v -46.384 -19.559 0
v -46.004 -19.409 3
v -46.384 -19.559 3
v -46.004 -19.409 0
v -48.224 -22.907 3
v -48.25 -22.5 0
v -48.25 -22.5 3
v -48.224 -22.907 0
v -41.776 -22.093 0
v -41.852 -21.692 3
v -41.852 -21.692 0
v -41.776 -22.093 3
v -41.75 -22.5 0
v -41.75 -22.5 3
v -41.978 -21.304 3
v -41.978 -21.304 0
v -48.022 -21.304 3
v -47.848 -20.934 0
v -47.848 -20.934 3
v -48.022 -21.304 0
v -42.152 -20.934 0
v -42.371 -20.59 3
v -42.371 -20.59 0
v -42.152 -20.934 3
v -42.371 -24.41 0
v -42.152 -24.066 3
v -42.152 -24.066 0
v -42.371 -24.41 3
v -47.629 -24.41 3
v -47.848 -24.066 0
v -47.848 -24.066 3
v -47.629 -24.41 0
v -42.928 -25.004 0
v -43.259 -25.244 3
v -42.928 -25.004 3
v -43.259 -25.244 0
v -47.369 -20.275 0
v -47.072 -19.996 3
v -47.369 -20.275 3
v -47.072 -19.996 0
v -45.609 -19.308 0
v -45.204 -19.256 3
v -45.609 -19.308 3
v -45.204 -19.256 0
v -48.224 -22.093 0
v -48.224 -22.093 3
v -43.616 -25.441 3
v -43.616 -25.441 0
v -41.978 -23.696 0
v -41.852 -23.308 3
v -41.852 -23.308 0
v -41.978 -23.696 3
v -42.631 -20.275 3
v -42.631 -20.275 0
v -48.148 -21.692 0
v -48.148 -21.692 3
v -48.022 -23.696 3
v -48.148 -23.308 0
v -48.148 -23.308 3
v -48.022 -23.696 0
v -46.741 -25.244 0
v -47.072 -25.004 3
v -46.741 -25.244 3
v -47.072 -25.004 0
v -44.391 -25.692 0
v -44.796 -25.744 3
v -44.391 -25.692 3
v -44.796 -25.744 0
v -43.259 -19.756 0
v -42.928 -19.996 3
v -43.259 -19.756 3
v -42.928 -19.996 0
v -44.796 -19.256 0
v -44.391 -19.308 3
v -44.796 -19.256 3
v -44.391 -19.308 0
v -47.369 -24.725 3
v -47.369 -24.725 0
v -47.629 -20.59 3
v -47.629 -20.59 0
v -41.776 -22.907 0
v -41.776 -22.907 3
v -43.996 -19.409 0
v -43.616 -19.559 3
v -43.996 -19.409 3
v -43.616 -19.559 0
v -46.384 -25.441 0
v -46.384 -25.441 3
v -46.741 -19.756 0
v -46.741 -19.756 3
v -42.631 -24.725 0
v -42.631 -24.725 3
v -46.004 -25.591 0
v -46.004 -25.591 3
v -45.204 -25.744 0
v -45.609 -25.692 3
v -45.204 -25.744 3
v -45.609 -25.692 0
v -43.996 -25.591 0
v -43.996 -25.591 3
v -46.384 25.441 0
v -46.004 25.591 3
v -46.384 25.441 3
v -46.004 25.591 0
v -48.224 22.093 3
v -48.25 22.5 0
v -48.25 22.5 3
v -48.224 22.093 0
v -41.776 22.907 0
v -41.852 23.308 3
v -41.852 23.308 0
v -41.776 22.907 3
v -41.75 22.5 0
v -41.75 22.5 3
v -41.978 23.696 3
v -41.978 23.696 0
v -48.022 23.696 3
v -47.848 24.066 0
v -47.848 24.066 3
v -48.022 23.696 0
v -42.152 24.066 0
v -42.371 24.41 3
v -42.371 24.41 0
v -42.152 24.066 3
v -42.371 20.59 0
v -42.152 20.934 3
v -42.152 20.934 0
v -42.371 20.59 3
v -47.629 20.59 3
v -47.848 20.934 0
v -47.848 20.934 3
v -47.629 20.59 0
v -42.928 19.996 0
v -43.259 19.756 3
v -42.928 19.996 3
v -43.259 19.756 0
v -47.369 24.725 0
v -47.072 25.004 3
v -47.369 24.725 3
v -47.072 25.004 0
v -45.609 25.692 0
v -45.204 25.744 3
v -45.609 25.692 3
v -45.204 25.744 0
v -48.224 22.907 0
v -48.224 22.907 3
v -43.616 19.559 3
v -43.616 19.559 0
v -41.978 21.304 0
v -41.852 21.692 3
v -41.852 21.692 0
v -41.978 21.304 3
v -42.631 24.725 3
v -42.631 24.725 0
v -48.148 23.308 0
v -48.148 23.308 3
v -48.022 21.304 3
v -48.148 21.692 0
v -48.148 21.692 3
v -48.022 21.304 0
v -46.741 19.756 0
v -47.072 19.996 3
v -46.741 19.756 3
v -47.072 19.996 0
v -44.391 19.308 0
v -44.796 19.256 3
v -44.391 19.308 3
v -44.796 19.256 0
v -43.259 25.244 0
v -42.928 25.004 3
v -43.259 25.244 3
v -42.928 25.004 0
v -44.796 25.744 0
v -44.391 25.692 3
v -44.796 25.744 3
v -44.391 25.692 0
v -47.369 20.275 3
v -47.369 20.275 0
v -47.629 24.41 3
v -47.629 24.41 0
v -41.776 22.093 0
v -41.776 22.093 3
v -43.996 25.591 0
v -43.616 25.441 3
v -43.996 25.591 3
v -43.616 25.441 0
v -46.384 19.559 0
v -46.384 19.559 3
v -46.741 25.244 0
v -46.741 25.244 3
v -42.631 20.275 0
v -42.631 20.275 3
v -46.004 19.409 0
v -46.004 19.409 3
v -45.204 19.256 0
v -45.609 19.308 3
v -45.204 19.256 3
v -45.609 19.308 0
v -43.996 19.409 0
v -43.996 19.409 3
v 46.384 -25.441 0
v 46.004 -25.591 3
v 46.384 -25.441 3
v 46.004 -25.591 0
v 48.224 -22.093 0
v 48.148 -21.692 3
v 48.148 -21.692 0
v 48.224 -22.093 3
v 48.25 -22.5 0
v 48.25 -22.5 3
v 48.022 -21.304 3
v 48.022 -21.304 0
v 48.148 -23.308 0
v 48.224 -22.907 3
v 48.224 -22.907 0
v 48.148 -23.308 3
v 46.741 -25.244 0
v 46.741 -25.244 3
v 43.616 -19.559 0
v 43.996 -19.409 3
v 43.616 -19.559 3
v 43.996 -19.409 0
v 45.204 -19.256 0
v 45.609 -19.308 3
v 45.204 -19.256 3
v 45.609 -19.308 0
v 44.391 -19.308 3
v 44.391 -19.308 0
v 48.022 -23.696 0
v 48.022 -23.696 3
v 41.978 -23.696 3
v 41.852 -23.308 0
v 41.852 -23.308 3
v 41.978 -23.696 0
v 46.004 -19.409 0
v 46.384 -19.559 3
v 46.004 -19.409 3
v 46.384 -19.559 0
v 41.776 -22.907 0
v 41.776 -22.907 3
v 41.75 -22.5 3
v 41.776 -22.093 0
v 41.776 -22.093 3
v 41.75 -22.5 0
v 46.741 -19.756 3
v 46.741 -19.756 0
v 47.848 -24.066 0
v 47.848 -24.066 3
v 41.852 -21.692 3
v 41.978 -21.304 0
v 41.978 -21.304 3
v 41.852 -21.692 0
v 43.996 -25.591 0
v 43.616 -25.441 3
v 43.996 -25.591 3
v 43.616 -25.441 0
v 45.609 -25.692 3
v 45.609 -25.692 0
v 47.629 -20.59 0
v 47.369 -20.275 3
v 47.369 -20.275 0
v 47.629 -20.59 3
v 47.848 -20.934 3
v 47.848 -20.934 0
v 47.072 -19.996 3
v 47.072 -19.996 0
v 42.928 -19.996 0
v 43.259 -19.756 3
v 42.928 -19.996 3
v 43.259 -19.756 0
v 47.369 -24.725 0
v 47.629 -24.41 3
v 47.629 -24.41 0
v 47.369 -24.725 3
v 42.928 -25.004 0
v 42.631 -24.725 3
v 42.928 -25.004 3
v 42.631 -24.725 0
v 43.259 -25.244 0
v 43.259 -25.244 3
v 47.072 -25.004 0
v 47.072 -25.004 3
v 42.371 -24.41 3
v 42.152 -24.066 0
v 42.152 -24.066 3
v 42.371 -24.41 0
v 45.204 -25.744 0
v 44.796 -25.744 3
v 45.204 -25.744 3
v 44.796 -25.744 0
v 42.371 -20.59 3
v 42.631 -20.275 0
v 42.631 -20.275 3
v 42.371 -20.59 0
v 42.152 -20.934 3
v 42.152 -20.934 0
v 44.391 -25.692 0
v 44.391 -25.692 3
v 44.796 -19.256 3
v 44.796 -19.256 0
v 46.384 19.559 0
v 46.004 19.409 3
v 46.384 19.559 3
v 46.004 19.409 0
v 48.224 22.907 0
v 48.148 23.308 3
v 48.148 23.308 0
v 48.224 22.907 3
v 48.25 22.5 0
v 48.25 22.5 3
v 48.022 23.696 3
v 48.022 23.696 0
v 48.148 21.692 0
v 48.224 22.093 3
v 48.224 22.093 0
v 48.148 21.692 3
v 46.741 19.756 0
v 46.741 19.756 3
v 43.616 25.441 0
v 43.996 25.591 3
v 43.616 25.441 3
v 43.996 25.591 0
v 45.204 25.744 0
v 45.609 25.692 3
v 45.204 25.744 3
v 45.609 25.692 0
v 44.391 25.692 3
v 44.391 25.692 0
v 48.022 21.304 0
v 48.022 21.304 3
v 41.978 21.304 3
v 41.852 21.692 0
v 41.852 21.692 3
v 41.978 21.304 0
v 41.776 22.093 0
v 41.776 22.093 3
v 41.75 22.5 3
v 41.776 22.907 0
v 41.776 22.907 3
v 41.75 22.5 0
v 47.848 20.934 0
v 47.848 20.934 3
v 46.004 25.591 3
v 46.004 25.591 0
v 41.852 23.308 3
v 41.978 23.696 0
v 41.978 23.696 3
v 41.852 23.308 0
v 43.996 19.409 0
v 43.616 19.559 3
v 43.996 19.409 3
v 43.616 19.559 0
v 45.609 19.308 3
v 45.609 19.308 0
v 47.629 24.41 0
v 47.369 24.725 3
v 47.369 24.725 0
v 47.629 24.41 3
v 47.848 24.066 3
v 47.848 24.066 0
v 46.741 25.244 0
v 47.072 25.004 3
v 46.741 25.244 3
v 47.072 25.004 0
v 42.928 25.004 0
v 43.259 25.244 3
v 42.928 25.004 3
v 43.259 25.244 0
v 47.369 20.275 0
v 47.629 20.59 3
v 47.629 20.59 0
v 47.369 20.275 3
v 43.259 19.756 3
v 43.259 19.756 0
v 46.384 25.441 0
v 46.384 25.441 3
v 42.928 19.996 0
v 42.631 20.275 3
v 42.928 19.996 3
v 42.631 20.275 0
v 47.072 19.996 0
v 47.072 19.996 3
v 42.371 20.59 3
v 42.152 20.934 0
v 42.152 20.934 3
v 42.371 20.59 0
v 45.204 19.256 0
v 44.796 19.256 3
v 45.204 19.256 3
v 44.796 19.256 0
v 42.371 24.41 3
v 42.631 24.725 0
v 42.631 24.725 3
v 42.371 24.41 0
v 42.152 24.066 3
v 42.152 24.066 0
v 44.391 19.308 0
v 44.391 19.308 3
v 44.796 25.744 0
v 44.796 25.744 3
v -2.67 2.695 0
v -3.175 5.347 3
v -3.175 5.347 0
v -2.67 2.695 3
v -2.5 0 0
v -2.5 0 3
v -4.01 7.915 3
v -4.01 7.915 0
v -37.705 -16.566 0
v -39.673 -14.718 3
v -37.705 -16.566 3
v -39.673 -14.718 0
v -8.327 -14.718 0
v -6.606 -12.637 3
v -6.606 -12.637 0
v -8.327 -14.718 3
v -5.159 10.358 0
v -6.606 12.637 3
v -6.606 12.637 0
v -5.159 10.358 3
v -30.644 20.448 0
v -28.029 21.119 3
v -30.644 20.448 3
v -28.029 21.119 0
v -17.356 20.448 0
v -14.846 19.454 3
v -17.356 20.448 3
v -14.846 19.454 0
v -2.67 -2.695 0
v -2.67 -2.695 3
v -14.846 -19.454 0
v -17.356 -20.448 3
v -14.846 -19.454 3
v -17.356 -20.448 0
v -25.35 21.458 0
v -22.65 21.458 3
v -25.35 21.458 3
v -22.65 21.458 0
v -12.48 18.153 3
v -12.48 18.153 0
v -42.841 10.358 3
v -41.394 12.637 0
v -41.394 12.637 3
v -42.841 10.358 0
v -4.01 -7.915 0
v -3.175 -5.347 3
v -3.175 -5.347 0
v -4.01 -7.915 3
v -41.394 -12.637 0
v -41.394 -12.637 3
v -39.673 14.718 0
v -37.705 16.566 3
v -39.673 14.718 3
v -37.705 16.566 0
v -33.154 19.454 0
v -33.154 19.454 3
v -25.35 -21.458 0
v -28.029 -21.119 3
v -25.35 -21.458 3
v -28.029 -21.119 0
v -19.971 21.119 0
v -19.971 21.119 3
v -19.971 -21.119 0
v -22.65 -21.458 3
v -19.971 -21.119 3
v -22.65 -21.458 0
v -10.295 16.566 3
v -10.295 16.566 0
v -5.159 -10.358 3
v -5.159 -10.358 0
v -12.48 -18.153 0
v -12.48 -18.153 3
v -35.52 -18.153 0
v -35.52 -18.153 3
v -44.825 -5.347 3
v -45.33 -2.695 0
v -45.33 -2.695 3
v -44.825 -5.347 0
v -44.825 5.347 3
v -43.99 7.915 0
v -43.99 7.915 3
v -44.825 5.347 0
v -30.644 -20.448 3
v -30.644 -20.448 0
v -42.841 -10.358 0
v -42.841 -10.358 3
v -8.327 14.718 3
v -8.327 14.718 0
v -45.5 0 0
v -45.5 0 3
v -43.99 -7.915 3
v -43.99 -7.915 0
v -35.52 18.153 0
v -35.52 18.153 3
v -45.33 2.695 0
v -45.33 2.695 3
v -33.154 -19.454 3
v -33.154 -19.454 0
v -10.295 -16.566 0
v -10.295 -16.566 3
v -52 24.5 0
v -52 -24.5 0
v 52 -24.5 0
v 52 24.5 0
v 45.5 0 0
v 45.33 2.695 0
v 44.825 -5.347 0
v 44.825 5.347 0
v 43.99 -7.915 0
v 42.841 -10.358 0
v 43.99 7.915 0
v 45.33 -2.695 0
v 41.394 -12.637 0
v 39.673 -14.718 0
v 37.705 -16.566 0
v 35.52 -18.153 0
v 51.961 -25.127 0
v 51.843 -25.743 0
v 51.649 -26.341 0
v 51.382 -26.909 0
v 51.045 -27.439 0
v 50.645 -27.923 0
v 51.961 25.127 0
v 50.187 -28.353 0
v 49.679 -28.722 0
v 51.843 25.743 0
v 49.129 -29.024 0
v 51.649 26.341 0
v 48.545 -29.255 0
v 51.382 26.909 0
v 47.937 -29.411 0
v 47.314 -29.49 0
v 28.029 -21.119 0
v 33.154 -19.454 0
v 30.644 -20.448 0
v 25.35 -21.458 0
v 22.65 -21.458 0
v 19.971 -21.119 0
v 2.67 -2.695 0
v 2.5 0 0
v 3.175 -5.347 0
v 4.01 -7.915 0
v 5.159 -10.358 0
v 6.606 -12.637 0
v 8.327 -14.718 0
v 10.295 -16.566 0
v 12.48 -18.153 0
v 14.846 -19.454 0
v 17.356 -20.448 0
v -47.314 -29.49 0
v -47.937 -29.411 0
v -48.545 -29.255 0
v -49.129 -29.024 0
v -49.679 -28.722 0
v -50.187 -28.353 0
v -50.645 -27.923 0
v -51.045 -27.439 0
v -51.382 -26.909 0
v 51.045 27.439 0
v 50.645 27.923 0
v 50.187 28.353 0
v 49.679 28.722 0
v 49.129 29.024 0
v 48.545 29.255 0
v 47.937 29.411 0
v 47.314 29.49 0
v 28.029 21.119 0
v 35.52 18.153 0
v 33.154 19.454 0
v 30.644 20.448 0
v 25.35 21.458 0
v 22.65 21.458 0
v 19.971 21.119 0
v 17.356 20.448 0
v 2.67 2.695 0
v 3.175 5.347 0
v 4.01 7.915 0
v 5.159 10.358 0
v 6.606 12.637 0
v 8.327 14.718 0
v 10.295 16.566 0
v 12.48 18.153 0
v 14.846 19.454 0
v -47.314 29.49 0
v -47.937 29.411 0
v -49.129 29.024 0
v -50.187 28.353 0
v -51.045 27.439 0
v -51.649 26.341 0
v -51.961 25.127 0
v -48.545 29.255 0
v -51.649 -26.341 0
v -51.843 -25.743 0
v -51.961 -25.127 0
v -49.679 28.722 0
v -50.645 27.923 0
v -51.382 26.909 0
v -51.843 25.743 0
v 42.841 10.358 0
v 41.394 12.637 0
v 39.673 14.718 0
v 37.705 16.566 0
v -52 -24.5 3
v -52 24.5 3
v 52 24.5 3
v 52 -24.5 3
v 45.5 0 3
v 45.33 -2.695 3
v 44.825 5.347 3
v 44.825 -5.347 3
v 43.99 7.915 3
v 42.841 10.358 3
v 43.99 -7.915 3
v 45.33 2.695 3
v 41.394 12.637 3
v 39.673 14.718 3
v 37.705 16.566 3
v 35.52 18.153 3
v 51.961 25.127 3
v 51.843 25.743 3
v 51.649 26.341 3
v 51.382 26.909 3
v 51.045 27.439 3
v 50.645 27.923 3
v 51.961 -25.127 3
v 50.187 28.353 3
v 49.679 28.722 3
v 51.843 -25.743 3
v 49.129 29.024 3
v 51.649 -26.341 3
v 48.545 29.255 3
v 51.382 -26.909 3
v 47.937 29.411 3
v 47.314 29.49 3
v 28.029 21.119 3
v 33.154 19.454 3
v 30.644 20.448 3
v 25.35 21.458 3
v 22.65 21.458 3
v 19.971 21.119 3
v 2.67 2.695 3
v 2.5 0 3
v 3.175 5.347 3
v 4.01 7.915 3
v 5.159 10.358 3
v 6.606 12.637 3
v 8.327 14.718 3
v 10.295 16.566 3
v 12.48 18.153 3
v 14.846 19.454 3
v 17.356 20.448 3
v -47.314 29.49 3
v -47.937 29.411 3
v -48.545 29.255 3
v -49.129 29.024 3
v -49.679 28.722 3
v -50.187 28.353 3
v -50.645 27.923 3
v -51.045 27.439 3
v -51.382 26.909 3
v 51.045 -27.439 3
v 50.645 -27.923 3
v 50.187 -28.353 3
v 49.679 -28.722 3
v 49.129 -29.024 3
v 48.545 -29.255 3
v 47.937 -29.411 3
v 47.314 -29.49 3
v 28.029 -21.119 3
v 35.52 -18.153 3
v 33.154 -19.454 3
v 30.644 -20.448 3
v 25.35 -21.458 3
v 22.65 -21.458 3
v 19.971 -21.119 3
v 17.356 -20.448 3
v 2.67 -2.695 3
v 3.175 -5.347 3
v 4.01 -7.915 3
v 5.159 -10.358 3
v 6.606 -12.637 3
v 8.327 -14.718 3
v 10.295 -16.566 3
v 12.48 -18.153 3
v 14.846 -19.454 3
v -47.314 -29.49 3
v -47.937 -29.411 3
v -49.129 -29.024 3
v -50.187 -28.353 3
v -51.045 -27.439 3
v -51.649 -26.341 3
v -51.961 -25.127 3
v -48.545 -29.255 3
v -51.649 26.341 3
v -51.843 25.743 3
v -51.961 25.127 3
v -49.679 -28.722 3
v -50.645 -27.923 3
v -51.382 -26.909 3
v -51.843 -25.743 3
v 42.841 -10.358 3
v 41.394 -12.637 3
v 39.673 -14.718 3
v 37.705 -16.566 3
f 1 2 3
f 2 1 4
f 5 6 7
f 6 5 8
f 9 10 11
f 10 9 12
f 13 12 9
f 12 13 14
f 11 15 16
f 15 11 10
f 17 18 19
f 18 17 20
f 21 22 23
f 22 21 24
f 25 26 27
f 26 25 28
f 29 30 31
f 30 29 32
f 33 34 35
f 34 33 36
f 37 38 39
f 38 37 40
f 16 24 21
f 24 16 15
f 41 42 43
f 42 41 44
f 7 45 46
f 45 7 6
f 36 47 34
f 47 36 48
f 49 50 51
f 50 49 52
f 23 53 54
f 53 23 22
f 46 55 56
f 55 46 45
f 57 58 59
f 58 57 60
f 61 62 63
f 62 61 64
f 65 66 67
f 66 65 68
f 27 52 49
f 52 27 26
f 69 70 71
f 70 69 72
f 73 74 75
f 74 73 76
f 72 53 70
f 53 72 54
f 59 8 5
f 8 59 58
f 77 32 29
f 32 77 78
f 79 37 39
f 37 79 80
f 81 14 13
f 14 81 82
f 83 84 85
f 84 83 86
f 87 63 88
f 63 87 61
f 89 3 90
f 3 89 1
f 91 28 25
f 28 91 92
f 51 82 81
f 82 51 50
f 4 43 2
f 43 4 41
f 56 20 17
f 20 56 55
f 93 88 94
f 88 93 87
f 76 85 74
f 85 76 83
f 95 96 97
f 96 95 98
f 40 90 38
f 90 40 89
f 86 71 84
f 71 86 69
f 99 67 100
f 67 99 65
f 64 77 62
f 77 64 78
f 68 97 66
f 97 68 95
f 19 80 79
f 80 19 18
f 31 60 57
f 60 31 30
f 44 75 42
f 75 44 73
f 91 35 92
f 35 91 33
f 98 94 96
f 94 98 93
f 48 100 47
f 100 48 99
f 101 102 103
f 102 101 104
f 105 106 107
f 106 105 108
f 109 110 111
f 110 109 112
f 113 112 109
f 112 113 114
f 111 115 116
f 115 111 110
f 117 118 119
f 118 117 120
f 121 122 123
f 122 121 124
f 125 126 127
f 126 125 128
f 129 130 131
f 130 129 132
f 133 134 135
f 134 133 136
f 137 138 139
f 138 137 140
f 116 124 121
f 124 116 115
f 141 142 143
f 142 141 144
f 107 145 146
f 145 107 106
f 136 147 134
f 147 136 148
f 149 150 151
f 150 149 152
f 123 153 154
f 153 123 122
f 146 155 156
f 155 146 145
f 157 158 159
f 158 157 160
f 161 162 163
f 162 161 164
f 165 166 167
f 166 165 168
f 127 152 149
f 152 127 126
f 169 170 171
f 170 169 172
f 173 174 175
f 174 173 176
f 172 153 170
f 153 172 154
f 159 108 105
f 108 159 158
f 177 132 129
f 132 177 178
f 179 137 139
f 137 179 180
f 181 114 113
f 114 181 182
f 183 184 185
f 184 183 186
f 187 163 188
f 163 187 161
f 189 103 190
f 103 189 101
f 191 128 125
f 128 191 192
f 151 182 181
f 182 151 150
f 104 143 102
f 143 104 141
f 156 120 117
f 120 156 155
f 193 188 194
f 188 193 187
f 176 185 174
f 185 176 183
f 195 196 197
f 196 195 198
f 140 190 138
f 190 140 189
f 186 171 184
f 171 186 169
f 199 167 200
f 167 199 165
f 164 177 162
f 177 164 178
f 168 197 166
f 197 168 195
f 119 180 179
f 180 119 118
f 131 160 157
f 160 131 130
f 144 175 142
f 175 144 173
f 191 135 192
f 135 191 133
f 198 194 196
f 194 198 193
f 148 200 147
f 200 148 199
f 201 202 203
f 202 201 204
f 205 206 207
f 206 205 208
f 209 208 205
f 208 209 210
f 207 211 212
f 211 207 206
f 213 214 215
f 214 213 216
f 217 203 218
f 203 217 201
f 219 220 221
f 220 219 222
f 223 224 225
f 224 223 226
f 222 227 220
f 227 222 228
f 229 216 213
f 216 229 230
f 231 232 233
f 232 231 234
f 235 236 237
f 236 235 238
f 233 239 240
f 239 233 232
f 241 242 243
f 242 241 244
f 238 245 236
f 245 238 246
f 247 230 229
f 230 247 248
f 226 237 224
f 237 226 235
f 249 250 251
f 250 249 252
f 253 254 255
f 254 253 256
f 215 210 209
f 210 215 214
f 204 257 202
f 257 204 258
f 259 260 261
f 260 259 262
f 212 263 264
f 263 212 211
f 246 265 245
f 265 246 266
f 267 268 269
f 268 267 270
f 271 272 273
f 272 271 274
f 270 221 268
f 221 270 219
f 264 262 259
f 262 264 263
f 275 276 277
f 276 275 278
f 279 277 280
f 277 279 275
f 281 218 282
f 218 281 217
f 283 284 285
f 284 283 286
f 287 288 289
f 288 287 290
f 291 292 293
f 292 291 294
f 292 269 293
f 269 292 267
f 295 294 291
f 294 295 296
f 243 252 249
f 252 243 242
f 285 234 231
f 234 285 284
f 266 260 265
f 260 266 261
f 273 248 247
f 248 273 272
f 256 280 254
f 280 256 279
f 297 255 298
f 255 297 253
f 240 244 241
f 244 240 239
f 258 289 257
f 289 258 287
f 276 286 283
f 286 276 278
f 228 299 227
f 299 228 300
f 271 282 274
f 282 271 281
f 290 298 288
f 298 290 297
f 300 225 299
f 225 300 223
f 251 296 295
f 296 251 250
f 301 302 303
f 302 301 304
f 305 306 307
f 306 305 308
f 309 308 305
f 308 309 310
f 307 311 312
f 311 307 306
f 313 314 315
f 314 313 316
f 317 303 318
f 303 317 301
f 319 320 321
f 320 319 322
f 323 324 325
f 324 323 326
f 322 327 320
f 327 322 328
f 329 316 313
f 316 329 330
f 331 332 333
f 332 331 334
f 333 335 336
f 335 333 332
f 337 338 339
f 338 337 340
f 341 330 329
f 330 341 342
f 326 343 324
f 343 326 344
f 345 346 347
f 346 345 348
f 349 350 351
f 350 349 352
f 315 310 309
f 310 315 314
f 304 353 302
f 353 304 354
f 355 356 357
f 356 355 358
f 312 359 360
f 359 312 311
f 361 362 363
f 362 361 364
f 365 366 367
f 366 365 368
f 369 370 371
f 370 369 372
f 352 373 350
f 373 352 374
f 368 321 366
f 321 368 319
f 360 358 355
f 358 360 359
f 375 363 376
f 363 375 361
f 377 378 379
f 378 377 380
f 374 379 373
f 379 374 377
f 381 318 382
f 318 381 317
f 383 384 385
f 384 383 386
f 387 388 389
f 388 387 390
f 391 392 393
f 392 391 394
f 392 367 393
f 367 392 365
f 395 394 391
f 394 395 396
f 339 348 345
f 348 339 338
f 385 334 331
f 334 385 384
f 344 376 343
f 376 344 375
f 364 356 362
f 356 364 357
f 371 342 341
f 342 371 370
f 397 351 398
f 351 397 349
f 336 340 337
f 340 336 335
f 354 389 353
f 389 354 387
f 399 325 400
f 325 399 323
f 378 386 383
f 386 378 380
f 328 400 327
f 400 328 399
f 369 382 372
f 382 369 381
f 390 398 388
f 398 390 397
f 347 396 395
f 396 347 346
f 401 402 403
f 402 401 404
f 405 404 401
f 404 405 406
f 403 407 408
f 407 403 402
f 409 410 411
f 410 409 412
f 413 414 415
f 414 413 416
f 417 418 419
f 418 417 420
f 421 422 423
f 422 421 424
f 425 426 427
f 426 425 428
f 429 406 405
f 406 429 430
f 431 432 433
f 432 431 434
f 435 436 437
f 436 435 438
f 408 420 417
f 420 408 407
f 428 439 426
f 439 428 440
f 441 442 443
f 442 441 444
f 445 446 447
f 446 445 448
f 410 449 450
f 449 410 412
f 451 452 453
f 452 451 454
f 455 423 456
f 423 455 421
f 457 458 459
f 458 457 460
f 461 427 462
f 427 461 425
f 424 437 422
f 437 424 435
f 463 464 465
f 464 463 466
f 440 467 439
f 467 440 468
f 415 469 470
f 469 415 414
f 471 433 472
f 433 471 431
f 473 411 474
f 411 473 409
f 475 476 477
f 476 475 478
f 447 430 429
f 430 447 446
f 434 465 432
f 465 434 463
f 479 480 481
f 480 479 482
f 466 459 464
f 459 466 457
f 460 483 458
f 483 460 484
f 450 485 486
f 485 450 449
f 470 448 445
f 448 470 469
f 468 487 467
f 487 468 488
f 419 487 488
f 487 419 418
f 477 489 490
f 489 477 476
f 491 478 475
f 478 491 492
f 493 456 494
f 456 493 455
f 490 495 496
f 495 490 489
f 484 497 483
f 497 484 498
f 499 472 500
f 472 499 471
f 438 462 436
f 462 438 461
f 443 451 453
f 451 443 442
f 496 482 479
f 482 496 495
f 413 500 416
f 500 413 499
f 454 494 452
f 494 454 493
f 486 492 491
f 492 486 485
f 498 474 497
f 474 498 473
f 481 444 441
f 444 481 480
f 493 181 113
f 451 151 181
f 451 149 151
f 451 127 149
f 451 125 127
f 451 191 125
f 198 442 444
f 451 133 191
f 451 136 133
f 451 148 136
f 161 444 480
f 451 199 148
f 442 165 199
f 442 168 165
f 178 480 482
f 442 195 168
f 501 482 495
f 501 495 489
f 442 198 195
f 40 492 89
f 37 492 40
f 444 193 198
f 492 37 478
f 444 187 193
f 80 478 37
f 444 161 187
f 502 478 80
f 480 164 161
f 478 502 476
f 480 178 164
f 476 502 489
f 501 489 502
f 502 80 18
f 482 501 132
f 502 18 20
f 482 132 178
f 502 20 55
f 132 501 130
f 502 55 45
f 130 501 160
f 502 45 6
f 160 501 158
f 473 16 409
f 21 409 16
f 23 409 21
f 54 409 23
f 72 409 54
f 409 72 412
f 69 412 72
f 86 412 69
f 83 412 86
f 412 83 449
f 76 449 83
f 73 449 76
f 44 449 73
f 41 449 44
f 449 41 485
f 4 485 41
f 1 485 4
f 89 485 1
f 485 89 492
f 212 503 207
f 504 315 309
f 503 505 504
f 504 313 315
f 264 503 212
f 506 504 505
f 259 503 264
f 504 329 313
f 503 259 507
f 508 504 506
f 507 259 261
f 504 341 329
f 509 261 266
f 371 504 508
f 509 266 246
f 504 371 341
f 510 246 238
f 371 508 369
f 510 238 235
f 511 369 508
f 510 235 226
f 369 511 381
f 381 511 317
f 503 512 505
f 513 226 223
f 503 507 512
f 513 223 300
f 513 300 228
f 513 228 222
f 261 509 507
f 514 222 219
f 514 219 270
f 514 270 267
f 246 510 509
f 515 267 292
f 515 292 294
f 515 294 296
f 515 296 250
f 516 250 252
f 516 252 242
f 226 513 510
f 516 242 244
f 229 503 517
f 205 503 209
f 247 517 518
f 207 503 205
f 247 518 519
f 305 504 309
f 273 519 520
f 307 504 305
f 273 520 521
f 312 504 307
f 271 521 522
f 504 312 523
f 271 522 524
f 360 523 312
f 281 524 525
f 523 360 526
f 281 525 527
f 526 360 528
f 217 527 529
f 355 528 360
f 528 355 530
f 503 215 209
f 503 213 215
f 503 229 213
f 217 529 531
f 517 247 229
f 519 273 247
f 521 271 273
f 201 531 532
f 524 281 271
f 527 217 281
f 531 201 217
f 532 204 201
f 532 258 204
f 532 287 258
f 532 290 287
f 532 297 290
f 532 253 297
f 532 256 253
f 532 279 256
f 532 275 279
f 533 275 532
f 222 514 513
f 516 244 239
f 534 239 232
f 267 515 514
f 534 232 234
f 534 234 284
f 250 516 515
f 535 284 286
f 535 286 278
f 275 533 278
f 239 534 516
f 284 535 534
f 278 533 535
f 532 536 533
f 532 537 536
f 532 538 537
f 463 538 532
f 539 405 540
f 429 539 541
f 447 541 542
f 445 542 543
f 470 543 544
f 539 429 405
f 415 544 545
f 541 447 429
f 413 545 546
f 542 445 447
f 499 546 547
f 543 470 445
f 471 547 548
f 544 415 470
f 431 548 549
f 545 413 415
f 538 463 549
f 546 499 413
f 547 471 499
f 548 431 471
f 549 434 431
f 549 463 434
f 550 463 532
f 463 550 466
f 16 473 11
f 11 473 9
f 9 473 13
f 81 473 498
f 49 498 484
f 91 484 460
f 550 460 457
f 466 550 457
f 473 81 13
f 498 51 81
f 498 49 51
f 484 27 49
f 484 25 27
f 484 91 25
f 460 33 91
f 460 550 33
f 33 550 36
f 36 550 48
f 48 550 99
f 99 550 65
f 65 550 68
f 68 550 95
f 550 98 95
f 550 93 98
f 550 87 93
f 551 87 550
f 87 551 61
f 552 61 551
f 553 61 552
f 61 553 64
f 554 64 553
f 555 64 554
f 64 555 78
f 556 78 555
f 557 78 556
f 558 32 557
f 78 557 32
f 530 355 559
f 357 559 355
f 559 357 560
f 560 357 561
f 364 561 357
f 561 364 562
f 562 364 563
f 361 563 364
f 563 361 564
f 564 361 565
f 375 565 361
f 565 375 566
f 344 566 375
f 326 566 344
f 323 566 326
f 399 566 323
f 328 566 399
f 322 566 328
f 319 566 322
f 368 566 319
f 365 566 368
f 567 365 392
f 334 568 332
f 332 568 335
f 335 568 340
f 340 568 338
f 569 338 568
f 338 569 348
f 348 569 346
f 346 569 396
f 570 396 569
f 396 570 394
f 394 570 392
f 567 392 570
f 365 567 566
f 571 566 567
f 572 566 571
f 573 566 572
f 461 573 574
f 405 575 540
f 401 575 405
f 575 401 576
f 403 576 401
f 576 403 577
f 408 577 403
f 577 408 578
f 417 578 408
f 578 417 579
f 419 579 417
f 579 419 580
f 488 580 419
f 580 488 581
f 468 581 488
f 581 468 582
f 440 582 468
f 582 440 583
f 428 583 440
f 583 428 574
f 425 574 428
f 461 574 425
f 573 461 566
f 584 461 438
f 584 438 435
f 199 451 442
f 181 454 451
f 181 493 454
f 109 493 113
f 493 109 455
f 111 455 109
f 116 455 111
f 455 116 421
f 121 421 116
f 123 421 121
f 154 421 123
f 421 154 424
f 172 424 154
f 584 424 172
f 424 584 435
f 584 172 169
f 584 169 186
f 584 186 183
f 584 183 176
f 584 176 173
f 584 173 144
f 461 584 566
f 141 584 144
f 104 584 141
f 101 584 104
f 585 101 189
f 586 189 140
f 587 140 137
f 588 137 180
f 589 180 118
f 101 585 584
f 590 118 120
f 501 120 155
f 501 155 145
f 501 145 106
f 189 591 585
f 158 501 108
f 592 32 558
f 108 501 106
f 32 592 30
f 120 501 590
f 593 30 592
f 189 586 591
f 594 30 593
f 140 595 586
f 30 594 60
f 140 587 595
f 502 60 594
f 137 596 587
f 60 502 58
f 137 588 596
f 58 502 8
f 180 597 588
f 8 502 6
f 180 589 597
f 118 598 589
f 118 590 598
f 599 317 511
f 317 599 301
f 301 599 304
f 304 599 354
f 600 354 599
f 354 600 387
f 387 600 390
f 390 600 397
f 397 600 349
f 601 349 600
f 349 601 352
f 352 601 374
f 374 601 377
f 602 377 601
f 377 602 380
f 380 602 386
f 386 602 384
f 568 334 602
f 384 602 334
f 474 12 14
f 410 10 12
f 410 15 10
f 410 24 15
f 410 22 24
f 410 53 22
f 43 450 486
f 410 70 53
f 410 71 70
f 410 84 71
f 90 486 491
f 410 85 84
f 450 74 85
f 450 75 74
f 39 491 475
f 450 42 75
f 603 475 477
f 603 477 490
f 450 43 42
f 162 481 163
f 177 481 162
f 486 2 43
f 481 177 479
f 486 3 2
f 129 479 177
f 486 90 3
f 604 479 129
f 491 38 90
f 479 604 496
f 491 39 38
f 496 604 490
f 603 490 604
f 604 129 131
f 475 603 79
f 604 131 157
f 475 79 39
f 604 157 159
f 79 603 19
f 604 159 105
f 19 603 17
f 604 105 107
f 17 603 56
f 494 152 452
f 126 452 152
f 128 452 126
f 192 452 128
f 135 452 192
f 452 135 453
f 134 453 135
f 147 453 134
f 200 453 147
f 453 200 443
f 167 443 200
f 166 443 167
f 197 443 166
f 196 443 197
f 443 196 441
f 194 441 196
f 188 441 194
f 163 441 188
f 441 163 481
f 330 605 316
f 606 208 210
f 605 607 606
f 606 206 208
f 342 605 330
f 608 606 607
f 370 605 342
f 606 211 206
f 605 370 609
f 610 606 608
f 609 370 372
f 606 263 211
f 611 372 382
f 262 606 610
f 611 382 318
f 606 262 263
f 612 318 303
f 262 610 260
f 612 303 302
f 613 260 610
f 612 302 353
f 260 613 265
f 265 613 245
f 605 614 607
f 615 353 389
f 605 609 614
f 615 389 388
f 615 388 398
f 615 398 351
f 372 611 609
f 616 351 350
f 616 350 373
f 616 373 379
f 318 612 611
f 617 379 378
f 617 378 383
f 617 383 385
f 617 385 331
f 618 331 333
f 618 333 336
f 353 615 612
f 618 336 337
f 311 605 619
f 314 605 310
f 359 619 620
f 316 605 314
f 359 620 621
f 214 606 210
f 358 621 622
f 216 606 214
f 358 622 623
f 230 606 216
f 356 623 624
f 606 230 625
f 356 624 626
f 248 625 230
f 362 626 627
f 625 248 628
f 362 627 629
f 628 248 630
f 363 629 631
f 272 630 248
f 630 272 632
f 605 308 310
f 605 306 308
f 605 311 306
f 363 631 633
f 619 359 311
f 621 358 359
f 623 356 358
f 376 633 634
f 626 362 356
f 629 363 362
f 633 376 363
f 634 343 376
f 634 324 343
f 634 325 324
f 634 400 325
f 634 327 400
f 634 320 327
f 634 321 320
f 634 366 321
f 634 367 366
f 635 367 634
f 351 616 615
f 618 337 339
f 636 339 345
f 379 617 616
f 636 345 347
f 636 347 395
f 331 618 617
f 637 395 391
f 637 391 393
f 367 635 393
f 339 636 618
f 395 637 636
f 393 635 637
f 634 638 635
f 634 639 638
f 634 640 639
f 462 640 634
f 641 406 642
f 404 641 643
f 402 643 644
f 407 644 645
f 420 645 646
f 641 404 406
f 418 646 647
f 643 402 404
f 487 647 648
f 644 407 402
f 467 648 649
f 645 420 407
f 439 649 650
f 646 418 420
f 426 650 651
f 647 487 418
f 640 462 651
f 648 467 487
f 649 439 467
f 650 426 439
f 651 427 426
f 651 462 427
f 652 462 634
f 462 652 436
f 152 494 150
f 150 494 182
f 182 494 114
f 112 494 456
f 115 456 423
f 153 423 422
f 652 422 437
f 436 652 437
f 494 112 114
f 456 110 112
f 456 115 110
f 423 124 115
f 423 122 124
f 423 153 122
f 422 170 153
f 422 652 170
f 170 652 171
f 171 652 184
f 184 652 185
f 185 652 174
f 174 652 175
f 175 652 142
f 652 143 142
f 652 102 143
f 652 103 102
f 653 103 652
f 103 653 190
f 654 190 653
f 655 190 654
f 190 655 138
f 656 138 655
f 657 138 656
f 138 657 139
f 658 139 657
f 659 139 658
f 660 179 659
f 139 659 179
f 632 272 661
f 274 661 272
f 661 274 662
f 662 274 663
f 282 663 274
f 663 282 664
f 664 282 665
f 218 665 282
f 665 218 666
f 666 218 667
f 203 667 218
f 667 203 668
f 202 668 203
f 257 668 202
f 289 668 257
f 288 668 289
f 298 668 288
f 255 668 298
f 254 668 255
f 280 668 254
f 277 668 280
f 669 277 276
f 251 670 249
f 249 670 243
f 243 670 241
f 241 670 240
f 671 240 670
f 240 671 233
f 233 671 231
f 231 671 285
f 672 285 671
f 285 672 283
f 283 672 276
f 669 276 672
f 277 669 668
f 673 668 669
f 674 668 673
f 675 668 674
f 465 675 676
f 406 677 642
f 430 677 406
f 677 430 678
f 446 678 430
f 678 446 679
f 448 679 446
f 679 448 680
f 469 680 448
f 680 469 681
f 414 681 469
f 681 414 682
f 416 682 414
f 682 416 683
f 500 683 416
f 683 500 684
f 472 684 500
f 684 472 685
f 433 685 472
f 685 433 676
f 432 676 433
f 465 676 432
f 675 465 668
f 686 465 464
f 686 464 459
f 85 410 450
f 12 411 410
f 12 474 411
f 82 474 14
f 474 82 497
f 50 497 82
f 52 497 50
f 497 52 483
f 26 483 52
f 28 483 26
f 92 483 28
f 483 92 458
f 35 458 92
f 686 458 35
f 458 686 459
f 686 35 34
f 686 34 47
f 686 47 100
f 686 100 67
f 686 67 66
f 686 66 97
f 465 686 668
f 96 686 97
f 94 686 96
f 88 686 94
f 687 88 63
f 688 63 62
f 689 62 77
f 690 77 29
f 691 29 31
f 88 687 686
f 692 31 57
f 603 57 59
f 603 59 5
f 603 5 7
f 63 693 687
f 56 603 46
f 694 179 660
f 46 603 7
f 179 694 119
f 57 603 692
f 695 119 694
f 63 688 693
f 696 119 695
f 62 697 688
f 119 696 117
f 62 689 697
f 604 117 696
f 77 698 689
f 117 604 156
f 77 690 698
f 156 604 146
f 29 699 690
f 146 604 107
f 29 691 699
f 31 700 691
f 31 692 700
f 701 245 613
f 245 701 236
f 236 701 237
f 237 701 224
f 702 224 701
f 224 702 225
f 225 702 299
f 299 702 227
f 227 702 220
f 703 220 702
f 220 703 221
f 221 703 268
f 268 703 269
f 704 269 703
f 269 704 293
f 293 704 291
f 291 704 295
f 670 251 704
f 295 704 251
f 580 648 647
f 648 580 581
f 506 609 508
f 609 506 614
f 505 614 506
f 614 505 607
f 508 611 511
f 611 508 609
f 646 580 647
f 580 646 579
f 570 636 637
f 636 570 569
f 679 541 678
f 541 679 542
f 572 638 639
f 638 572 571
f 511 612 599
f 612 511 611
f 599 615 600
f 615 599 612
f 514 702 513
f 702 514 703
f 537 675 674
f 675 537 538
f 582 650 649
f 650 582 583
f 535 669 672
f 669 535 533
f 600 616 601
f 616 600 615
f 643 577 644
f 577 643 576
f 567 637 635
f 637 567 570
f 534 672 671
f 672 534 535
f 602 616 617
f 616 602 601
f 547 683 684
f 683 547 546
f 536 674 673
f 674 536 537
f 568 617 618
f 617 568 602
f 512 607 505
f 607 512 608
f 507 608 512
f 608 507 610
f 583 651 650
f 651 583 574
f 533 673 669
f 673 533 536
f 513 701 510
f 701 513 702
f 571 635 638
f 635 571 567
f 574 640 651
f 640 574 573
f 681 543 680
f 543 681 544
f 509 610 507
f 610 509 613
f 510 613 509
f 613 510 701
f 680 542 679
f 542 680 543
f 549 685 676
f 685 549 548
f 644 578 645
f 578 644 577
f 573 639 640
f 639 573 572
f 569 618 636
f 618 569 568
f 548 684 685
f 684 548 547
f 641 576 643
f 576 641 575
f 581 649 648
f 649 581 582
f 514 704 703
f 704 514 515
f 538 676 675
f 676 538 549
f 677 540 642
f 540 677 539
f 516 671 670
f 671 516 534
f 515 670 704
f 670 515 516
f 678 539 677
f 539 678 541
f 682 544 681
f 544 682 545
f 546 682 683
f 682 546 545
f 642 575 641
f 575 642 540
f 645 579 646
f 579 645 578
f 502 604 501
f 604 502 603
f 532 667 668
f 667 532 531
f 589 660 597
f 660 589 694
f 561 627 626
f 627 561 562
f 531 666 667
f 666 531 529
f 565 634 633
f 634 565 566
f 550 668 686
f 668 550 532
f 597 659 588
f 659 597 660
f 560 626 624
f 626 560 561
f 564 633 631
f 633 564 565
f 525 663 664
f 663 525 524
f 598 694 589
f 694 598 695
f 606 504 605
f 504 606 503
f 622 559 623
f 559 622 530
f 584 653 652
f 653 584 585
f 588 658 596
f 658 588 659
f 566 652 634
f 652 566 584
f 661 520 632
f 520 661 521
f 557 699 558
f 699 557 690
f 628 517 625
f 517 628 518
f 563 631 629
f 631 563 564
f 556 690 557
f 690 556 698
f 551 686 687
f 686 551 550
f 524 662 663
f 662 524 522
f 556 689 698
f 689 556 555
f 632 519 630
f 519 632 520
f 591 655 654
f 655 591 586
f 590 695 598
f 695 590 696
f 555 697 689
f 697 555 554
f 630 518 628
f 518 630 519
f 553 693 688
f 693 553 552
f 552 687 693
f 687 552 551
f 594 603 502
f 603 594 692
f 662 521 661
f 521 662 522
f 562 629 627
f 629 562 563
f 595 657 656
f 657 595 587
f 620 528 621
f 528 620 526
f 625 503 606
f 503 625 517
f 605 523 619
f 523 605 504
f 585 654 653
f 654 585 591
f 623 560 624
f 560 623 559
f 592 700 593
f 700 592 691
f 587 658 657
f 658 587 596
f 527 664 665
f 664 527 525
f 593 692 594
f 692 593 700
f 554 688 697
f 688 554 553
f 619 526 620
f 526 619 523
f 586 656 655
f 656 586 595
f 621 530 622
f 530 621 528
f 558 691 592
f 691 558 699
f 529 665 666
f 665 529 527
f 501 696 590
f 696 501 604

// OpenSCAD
$fn = 50;

difference() {
	union() {
		hull() {
			translate(v = [-47.0, 24.5, 0]) {
				cylinder(h = 3, r = 5);
			}
			translate(v = [47.0, 24.5, 0]) {
				cylinder(h = 3, r = 5);
			}
			translate(v = [-47.0, -24.5, 0]) {
				cylinder(h = 3, r = 5);
			}
			translate(v = [47.0, -24.5, 0]) {
				cylinder(h = 3, r = 5);
			}
		}
	}
	union() {
		translate(v = [-45.0, -22.5, -100.0]) {
			cylinder(h = 200, r = 3.25);
		}
		translate(v = [-45.0, 22.5, -100.0]) {
			cylinder(h = 200, r = 3.25);
		}
		translate(v = [45.0, -22.5, -100.0]) {
			cylinder(h = 200, r = 3.25);
		}
		translate(v = [45.0, 22.5, -100.0]) {
			cylinder(h = 200, r = 3.25);
		}
		translate(v = [-45.0, -22.5, -100.0]) {
			cylinder(h = 200, r = 1.8);
		}
		translate(v = [-45.0, 22.5, -100.0]) {
			cylinder(h = 200, r = 1.8);
		}
		translate(v = [45.0, -22.5, -100.0]) {
			cylinder(h = 200, r = 1.8);
		}
		translate(v = [45.0, 22.5, -100.0]) {
			cylinder(h = 200, r = 1.8);
		}
		translate(v = [-24.0, 0, 0.0]) {
			cylinder(h = 3, r = 21.5);
		}
		translate(v = [24.0, 0, 0.0]) {
			cylinder(h = 3, r = 21.5);
		}
	}
}
